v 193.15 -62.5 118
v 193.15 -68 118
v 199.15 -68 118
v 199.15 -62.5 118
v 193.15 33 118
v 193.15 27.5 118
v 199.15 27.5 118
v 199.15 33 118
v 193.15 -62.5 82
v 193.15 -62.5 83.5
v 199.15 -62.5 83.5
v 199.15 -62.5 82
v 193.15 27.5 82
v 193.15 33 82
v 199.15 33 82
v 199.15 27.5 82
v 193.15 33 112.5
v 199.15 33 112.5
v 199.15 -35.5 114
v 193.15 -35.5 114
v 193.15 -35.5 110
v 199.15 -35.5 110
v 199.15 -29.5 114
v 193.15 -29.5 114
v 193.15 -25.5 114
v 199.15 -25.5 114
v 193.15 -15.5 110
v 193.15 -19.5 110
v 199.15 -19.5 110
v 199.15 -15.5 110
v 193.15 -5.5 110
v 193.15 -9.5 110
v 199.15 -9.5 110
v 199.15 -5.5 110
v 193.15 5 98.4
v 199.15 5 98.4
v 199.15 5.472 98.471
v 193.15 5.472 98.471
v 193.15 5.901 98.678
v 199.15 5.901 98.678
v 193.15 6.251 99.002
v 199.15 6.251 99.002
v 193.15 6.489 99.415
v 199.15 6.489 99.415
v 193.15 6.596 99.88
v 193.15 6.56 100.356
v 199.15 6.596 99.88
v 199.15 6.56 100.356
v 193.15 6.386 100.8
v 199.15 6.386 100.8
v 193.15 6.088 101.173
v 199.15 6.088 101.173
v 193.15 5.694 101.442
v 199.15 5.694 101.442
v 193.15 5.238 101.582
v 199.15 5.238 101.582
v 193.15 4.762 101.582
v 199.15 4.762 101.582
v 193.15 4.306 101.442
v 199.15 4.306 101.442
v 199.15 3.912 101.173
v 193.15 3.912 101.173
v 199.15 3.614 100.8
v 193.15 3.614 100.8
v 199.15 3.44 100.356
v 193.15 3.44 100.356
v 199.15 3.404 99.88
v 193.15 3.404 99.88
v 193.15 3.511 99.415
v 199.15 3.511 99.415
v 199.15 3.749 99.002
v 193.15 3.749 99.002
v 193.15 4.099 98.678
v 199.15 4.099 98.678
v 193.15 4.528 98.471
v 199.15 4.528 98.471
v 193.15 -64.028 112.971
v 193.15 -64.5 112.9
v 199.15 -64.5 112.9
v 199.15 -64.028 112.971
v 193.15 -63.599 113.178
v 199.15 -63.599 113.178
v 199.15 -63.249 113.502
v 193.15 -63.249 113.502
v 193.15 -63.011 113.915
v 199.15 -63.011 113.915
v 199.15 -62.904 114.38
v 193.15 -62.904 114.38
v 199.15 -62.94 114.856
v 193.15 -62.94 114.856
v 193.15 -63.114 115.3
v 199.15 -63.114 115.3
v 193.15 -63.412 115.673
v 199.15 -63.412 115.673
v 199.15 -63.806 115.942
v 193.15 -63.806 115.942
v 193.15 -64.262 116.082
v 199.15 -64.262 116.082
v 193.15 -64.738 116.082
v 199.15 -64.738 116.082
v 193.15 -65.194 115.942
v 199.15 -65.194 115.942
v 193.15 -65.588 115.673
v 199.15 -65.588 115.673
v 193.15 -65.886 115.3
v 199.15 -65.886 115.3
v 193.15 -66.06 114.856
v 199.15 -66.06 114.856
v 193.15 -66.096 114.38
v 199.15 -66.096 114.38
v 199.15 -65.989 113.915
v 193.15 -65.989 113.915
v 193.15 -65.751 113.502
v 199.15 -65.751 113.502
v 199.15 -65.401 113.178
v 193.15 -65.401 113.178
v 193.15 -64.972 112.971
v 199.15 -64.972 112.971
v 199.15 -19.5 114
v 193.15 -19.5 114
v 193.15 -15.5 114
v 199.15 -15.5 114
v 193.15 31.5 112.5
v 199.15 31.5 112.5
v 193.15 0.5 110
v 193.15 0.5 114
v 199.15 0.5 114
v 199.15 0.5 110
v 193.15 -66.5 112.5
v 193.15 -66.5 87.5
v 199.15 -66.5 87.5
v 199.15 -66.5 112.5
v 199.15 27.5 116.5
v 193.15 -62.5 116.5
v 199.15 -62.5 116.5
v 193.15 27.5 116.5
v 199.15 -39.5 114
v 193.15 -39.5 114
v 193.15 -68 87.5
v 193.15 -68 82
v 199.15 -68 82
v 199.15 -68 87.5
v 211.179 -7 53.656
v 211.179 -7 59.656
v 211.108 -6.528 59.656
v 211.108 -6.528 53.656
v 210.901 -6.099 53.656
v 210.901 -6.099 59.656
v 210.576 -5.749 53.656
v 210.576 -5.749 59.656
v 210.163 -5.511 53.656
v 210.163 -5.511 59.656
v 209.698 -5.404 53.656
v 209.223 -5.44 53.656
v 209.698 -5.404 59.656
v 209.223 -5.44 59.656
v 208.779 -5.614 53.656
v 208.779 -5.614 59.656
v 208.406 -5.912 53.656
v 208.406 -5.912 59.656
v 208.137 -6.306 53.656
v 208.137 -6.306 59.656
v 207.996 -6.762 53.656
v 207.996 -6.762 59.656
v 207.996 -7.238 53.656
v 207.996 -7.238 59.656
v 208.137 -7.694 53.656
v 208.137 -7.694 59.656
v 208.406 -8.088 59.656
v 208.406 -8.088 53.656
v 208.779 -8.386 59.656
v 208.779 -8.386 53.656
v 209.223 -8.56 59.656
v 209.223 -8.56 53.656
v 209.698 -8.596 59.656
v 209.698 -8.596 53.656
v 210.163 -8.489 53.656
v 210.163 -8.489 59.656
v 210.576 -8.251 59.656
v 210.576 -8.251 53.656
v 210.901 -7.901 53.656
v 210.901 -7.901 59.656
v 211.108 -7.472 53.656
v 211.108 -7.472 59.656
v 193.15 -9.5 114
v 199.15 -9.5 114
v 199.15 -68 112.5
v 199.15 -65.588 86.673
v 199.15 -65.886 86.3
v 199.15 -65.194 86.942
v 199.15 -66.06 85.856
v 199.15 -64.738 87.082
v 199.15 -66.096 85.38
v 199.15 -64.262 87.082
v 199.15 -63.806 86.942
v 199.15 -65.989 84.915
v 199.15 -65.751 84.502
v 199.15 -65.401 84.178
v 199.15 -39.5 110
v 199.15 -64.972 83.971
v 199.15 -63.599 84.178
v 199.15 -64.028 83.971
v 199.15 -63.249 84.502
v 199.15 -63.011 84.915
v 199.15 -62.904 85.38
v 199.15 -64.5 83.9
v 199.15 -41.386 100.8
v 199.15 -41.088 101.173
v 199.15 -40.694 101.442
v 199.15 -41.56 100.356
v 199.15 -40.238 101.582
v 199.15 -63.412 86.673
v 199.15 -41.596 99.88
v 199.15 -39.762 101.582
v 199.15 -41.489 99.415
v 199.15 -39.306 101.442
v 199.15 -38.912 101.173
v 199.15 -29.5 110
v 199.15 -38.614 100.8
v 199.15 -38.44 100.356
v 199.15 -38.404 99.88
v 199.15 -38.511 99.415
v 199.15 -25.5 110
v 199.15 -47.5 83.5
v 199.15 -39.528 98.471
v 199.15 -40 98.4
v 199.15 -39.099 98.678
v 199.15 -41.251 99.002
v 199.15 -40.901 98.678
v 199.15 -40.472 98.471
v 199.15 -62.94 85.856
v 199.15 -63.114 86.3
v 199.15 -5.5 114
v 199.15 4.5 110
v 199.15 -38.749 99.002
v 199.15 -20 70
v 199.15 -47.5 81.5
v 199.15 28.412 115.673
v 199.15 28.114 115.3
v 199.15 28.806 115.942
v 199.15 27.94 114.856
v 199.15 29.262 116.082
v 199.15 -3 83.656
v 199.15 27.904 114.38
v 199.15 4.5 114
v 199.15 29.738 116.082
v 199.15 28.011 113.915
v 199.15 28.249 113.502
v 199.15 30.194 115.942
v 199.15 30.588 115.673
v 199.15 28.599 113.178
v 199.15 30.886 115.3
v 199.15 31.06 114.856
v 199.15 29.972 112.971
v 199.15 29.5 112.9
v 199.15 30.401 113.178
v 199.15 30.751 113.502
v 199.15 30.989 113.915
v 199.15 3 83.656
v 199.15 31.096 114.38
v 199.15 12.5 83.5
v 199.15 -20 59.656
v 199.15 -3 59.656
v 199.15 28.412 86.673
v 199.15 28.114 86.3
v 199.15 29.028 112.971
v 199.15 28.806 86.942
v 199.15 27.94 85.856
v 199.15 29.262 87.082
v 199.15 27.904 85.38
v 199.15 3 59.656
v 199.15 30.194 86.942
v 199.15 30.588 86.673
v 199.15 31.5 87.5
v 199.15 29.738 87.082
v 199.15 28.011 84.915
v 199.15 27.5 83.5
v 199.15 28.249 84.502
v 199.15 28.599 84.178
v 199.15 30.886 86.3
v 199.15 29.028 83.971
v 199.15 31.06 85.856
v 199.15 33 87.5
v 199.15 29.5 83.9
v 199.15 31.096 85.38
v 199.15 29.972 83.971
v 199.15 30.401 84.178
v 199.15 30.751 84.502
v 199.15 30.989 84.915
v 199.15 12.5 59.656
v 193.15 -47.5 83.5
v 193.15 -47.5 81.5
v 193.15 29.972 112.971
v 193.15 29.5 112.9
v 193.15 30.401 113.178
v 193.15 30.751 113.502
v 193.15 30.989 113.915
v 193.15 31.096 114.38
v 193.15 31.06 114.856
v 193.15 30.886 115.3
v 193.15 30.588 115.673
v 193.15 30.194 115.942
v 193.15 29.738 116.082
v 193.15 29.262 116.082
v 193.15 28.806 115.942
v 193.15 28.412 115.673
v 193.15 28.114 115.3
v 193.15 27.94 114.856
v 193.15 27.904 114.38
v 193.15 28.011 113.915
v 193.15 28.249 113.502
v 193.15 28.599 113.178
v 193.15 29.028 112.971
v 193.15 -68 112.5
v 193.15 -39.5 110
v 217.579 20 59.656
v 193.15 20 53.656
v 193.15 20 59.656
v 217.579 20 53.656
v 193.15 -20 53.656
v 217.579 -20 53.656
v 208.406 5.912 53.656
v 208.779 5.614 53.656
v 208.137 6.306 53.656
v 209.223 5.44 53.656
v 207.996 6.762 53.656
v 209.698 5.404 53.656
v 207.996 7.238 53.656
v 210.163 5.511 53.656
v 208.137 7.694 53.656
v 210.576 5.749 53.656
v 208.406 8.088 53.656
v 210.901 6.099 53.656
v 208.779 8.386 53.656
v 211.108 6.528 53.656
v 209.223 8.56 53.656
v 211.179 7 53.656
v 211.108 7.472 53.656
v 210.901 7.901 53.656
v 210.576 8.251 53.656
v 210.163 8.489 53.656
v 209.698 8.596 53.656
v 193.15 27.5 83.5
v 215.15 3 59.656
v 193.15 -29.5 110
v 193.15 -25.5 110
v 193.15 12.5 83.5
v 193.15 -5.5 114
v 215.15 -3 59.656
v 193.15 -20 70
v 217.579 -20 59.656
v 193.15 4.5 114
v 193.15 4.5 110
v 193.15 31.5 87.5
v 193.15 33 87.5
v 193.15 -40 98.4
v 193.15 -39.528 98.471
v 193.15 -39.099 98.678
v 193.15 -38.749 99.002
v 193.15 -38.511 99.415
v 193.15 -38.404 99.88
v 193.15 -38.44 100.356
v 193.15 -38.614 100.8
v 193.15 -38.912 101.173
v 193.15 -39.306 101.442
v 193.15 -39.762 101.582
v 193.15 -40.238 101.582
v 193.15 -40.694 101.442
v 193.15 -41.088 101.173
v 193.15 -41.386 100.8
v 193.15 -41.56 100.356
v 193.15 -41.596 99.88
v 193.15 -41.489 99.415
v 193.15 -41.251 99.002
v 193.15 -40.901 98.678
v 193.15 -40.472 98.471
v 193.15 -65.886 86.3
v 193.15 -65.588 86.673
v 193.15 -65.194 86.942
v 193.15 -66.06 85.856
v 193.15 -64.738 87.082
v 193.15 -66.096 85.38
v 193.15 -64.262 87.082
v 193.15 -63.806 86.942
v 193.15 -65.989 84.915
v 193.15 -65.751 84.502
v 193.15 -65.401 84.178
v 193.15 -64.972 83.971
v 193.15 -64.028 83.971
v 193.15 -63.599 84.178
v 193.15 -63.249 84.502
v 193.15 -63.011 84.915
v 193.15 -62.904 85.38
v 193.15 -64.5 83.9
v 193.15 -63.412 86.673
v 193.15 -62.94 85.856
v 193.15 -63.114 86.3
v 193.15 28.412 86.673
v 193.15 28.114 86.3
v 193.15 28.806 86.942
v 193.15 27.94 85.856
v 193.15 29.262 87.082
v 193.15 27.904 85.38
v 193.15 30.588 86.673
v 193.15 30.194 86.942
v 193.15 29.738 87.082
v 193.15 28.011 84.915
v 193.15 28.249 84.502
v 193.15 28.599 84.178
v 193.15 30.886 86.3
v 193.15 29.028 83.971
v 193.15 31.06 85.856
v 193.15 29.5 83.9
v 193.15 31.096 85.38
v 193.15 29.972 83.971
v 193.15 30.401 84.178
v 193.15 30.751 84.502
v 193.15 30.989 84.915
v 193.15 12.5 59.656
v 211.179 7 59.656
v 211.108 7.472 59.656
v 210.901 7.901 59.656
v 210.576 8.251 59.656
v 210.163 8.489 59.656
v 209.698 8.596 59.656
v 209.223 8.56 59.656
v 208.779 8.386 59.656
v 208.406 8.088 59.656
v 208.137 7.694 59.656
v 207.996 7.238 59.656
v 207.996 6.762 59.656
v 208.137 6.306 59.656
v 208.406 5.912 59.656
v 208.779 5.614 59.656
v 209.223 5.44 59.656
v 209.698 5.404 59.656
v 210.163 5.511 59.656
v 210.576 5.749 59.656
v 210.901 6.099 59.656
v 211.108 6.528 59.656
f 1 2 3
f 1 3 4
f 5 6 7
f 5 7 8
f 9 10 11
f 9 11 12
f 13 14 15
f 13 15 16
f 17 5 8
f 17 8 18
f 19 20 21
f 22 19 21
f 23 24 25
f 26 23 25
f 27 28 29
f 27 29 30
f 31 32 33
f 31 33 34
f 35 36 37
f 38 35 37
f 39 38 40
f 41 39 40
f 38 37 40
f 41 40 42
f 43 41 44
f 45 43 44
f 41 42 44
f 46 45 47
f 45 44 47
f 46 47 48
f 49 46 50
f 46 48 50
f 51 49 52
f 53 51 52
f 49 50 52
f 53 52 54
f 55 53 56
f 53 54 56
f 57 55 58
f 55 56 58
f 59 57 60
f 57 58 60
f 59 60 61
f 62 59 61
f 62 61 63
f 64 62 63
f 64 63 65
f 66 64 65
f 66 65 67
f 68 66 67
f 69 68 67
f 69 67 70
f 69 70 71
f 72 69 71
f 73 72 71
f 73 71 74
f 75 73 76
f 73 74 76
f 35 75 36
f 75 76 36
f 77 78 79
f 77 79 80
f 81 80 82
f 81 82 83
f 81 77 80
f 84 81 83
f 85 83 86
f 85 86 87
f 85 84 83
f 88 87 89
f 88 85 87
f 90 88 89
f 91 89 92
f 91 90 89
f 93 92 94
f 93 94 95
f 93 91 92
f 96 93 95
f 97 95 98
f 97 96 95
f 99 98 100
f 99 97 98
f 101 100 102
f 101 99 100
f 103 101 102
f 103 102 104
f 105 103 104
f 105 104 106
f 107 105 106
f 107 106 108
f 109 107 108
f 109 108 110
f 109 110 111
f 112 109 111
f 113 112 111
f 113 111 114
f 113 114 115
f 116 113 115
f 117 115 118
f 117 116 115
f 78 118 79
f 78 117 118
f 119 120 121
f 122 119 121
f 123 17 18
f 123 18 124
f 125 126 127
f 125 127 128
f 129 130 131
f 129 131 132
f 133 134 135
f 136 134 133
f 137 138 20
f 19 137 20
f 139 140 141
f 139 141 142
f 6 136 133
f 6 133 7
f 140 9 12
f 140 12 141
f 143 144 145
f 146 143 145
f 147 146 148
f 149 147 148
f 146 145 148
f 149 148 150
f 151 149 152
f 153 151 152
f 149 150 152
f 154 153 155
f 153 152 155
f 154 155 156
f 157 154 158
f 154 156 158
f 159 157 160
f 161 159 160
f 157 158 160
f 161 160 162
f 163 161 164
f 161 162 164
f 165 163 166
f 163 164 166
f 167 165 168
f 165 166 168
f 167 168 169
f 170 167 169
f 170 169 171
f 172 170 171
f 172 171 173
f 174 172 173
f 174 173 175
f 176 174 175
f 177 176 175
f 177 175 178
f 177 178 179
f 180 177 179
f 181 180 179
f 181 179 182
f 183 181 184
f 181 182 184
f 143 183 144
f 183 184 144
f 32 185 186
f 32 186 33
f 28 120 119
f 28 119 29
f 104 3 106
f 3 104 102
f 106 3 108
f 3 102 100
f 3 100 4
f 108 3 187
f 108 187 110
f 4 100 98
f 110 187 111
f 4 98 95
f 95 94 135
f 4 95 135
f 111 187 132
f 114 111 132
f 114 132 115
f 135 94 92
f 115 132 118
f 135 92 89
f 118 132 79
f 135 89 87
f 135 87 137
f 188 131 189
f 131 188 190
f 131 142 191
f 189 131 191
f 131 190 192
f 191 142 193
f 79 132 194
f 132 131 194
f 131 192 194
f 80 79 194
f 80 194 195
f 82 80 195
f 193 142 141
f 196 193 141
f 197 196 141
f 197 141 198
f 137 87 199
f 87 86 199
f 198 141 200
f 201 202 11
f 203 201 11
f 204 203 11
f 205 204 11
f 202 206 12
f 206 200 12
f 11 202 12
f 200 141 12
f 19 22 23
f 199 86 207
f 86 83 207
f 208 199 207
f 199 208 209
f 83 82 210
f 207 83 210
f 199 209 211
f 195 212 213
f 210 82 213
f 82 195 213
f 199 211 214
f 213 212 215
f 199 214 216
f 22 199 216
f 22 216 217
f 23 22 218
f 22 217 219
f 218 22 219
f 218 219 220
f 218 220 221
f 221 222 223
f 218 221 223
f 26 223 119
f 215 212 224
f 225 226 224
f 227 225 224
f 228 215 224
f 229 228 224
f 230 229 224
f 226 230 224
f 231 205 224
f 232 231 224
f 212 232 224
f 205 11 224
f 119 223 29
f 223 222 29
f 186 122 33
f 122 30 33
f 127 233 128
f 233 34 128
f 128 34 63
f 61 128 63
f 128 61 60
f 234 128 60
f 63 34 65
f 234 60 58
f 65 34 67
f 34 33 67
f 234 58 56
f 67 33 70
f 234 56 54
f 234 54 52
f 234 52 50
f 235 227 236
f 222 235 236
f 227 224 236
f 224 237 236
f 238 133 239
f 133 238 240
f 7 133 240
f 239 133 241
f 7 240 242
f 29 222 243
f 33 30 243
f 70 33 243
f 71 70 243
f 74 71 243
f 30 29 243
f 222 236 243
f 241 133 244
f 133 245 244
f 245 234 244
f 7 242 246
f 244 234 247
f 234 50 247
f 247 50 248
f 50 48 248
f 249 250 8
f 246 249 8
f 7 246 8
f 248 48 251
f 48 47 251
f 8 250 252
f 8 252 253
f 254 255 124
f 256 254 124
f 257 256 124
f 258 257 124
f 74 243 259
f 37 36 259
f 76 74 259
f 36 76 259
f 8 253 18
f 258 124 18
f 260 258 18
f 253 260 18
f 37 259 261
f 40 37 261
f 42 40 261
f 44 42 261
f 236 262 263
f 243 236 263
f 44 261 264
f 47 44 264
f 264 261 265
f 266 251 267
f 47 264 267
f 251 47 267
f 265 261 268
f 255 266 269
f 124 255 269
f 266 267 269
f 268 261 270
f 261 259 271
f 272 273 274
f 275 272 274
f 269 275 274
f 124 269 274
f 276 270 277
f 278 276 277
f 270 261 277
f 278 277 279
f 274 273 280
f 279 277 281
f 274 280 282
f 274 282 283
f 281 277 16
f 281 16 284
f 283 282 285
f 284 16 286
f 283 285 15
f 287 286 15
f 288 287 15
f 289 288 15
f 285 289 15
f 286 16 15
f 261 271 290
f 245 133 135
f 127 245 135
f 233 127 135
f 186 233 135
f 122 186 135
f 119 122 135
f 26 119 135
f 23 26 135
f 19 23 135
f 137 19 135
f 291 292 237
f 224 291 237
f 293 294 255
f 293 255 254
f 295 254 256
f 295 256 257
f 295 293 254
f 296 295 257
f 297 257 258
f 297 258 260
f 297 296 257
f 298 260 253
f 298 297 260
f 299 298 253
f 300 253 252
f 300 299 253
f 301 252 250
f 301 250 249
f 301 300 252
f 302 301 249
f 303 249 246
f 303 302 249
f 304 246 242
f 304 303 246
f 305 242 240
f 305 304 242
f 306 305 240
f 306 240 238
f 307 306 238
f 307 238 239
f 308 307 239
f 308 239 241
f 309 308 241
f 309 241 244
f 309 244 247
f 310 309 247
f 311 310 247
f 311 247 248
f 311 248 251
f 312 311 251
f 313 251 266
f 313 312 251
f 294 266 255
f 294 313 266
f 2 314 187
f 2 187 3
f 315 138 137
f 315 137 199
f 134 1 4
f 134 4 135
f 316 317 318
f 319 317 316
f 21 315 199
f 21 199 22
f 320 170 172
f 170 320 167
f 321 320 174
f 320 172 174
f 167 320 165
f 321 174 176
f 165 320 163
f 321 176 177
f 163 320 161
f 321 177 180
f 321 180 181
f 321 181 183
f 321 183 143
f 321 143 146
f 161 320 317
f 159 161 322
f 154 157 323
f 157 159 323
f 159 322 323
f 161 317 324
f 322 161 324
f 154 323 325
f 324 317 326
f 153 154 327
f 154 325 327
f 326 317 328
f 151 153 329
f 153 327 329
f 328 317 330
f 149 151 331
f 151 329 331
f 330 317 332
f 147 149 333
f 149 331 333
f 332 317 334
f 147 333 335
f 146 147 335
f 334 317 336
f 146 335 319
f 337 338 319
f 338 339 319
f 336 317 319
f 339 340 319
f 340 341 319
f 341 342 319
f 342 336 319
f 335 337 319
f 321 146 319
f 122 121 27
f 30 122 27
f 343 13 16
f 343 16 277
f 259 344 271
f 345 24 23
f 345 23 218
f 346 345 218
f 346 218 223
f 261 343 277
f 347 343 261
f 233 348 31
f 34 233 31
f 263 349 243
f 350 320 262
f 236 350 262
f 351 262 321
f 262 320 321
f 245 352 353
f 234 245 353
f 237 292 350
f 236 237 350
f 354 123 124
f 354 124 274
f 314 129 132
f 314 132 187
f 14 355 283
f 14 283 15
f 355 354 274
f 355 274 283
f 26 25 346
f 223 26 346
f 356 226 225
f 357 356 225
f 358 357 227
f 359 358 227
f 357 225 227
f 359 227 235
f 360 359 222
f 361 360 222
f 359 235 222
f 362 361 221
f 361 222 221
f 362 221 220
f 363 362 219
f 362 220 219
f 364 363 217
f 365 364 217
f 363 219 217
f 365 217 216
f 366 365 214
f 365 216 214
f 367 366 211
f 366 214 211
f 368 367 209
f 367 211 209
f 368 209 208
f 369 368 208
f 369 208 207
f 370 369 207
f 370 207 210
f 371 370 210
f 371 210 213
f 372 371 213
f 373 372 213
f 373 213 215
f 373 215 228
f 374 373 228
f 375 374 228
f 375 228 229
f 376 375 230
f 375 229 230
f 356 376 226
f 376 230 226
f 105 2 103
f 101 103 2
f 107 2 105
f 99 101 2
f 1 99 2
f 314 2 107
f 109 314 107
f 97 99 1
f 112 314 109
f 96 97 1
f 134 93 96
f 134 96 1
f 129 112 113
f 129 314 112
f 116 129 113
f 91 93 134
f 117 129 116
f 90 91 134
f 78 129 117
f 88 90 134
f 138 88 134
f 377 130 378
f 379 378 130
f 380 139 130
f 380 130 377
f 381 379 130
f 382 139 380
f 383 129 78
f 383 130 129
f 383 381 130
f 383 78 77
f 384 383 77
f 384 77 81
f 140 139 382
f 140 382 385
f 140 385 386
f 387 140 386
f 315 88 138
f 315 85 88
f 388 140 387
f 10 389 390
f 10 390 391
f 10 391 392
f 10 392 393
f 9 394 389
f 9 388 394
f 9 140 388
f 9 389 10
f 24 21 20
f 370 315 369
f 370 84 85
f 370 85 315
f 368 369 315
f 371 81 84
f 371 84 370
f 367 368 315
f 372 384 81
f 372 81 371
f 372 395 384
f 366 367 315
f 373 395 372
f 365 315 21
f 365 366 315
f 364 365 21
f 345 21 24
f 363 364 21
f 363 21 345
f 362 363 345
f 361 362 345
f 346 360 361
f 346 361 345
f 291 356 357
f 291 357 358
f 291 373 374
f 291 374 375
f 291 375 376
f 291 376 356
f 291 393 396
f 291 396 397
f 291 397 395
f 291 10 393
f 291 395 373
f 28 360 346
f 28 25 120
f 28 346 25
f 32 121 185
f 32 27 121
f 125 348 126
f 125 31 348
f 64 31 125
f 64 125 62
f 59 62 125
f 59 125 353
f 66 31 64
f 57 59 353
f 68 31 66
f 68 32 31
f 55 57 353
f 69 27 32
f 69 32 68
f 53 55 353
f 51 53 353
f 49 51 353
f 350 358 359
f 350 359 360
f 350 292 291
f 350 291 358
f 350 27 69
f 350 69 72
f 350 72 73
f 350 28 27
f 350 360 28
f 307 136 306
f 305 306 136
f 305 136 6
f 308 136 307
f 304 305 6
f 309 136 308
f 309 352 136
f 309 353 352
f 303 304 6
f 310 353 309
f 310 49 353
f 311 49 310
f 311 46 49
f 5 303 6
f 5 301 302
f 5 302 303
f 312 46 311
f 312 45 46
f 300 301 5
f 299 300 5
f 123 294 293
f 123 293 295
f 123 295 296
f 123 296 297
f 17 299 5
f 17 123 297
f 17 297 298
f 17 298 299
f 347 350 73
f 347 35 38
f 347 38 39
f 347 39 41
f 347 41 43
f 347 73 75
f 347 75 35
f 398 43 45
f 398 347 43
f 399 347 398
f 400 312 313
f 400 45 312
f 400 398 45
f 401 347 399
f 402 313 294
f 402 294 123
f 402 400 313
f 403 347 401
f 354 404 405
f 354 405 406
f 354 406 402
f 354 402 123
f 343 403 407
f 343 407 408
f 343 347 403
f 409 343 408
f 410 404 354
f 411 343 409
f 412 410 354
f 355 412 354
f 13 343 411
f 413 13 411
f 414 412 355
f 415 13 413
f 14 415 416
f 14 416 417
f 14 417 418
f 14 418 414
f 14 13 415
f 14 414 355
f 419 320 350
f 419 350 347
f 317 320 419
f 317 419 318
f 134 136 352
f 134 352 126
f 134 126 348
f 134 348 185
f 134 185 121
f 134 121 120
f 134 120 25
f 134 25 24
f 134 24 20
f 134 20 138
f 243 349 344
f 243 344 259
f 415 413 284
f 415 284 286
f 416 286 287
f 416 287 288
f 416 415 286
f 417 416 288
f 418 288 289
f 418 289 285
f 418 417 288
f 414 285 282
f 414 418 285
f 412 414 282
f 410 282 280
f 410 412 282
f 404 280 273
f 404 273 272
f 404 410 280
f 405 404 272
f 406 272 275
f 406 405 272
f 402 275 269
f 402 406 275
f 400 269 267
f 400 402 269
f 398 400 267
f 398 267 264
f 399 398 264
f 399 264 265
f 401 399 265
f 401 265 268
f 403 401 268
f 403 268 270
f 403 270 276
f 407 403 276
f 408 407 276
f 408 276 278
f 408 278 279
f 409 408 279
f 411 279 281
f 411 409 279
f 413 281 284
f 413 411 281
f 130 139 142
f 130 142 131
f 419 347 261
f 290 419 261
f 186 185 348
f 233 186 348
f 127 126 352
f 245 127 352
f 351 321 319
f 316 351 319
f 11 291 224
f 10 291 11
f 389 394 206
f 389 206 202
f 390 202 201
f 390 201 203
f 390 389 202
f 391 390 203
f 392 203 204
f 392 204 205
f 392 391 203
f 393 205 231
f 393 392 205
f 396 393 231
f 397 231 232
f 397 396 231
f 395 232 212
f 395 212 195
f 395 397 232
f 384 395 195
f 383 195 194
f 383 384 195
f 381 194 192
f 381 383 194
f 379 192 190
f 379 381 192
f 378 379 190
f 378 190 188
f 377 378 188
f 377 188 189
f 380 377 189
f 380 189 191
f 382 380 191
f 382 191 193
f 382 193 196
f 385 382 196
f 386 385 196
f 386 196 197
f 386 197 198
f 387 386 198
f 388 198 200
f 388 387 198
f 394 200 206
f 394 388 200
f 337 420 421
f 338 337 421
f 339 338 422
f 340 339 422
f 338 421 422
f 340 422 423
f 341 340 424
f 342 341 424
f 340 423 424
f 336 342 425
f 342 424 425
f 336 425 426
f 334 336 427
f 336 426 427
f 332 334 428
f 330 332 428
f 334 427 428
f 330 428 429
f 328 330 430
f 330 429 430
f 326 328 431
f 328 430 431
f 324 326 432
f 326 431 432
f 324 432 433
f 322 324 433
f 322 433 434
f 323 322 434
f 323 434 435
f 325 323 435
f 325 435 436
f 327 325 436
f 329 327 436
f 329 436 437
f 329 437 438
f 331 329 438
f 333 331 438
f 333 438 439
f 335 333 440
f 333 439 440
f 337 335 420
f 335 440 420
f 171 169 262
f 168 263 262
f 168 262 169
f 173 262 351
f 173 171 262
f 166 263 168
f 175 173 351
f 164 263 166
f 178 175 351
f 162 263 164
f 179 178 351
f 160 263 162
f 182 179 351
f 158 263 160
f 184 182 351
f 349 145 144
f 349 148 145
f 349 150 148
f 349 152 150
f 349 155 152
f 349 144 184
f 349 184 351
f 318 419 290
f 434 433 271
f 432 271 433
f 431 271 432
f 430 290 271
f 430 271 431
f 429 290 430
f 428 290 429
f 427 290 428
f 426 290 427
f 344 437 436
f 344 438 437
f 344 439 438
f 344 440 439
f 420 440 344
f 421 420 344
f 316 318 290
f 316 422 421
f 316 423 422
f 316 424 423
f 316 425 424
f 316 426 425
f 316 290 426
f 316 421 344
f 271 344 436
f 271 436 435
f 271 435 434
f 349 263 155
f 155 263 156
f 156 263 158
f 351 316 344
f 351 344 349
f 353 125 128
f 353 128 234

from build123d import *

# Parameters (mm, degrees)
EXTRUDE_1_DEPTH     = 6
SKETCH_2_R          = 1.6
CUT_EXTRUDE_1_DEPTH = 6
SKETCH_3_W          = 26
SKETCH_3_H          = 60
CUT_EXTRUDE_2_DEPTH = 6
SKETCH_4_W          = 4
SKETCH_4_H          = 4
CUT_EXTRUDE_3_DEPTH = 6
SKETCH_5_W          = 24.42858663
SKETCH_5_H          = 75.5
EXTRUDE_2_DEPTH     = 6
SKETCH_6_W          = 6
SKETCH_6_H          = 60
EXTRUDE_3_DEPTH     = 54.343929089
SKETCH_7_R          = 1.6
CUT_EXTRUDE_4_DEPTH = 6
SKETCH_8_R          = 1.6
CUT_EXTRUDE_5_DEPTH = 6
EXTRUDE_5_DEPTH     = 6
SKETCH_15_W         = 30
SKETCH_15_H         = 60
CUT_EXTRUDE_6_DEPTH = 20
SKETCH_16_W         = 30
SKETCH_16_H         = 30
CUT_EXTRUDE_7_DEPTH = 20
CUT_EXTRUDE_8_DEPTH = 10


with BuildPart() as part:
    # 草图1 → 凸台-拉伸1 (new body)
    with BuildSketch(Plane(origin=(193.15, 0, 0), x_dir=(0, 0, -1), z_dir=(1, 0, 0))):
        Polygon((-82, -62.5), (-82, -68), (-87.5, -68), (-87.5, -66.5), (-112.5, -66.5), (-112.5, -68), (-118, -68), (-118, -62.5), (-116.5, -62.5), (-116.5, 27.5), (-118, 27.5), (-118, 33), (-112.5, 33), (-112.5, 31.5), (-87.5, 31.5), (-87.5, 33), (-82, 33), (-82, 27.5), (-83.5, 27.5), (-83.5, -62.5), align=None)
    extrude(amount=EXTRUDE_1_DEPTH)

    # 草图2 → 切除-拉伸1 (cut)
    with BuildSketch(Plane(origin=(193.15, 0, 0), x_dir=(0, 0, -1), z_dir=(1, 0, 0))):
        with Locations((-85.5, -64.5)):
            Circle(SKETCH_2_R)
        with Locations((-114.5, -64.5)):
            Circle(SKETCH_2_R)
        with Locations((-85.5, 29.5)):
            Circle(SKETCH_2_R)
        with Locations((-114.5, 29.5)):
            Circle(SKETCH_2_R)
    extrude(amount=CUT_EXTRUDE_1_DEPTH, mode=Mode.SUBTRACT)

    # 草图3 → 切除-拉伸2 (cut)
    with BuildSketch(Plane(origin=(193.15, 0, 0), x_dir=(0, 0, -1), z_dir=(1, 0, 0))):
        with Locations((-94, -17.5)):
            Rectangle(SKETCH_3_W, SKETCH_3_H)
    extrude(amount=CUT_EXTRUDE_2_DEPTH, mode=Mode.SUBTRACT)

    # 草图4 → 切除-拉伸3 (cut)
    with BuildSketch(Plane(origin=(193.15, 0, 0), x_dir=(0, 0, -1), z_dir=(1, 0, 0))):
        with Locations((-112, -37.5)):
            Rectangle(SKETCH_4_W, SKETCH_4_H)
        with Locations((-112, -27.5)):
            Rectangle(SKETCH_4_W, SKETCH_4_H)
        with Locations((-112, -17.5)):
            Rectangle(SKETCH_4_W, SKETCH_4_H)
        with Locations((-112, -7.5)):
            Rectangle(SKETCH_4_W, SKETCH_4_H)
        with Locations((-112, 2.5)):
            Rectangle(SKETCH_4_W, SKETCH_4_H)
    extrude(amount=CUT_EXTRUDE_3_DEPTH, mode=Mode.SUBTRACT)



with BuildPart() as body_2:
    # 草图5 → 凸台-拉伸2 (new body)
    with BuildSketch(Plane.XY.offset(53.656070911)):
        with Locations((205.364293315, -9.75)):
            Rectangle(SKETCH_5_W, SKETCH_5_H)
    extrude(amount=EXTRUDE_2_DEPTH)


with BuildPart() as part_1:
    add(part.part)

    add(body_2.part)  # 凸台-拉伸3 merges body 2
    # 草图6 → 凸台-拉伸3 (add)
    with BuildSketch(Plane.XY.offset(53.656070911)):
        with Locations((196.15, -17.5)):
            Rectangle(SKETCH_6_W, SKETCH_6_H)
    extrude(amount=EXTRUDE_3_DEPTH)

    # 草图7 → 切除-拉伸4 (cut)
    with BuildSketch(Plane.XY.offset(59.656070911)):
        with Locations((209.57858663, -7)):
            Circle(SKETCH_7_R)
        with Locations((209.57858663, 7)):
            Circle(SKETCH_7_R)
    extrude(amount=-CUT_EXTRUDE_4_DEPTH, mode=Mode.SUBTRACT)

    # 草图8 → 切除-拉伸5 (cut)
    with BuildSketch(Plane(origin=(199.15, 0, 0), x_dir=(0, 0, -1), z_dir=(1, 0, 0))):
        with Locations((-100, -40)):
            Circle(SKETCH_8_R)
        with Locations((-100, 5)):
            Circle(SKETCH_8_R)
    extrude(amount=-CUT_EXTRUDE_5_DEPTH, mode=Mode.SUBTRACT)

    # 草图10 → 凸台-拉伸5 (add)
    with BuildSketch(Plane(origin=(0, -3, 0), x_dir=(1, 0, 0), z_dir=(0, 1, 0))):
        Polygon((199.15, -59.656070911), (215.15, -59.656070911), (199.15, -83.656070911), align=None)
    extrude(amount=EXTRUDE_5_DEPTH)

    # 草图15 → 切除-拉伸6 (cut)
    with BuildSketch(Plane.XY.offset(50)):
        with Locations((205, -50)):
            Rectangle(SKETCH_15_W, SKETCH_15_H)
    extrude(amount=CUT_EXTRUDE_6_DEPTH, mode=Mode.SUBTRACT)

    # 草图16 → 切除-拉伸7 (cut)
    with BuildSketch(Plane.XY.offset(50)):
        with Locations((205, 35)):
            Rectangle(SKETCH_16_W, SKETCH_16_H)
    extrude(amount=CUT_EXTRUDE_7_DEPTH, mode=Mode.SUBTRACT)

    # 草图17 → 切除-拉伸8 (cut)
    with BuildSketch(Plane(origin=(190, 0, 0), x_dir=(0, 0, -1), z_dir=(1, 0, 0))):
        Polygon((-70, -47.5), (-81.5, -47.5), (-70, -20), align=None)
    extrude(amount=CUT_EXTRUDE_8_DEPTH, mode=Mode.SUBTRACT)


solid = part_1.part
